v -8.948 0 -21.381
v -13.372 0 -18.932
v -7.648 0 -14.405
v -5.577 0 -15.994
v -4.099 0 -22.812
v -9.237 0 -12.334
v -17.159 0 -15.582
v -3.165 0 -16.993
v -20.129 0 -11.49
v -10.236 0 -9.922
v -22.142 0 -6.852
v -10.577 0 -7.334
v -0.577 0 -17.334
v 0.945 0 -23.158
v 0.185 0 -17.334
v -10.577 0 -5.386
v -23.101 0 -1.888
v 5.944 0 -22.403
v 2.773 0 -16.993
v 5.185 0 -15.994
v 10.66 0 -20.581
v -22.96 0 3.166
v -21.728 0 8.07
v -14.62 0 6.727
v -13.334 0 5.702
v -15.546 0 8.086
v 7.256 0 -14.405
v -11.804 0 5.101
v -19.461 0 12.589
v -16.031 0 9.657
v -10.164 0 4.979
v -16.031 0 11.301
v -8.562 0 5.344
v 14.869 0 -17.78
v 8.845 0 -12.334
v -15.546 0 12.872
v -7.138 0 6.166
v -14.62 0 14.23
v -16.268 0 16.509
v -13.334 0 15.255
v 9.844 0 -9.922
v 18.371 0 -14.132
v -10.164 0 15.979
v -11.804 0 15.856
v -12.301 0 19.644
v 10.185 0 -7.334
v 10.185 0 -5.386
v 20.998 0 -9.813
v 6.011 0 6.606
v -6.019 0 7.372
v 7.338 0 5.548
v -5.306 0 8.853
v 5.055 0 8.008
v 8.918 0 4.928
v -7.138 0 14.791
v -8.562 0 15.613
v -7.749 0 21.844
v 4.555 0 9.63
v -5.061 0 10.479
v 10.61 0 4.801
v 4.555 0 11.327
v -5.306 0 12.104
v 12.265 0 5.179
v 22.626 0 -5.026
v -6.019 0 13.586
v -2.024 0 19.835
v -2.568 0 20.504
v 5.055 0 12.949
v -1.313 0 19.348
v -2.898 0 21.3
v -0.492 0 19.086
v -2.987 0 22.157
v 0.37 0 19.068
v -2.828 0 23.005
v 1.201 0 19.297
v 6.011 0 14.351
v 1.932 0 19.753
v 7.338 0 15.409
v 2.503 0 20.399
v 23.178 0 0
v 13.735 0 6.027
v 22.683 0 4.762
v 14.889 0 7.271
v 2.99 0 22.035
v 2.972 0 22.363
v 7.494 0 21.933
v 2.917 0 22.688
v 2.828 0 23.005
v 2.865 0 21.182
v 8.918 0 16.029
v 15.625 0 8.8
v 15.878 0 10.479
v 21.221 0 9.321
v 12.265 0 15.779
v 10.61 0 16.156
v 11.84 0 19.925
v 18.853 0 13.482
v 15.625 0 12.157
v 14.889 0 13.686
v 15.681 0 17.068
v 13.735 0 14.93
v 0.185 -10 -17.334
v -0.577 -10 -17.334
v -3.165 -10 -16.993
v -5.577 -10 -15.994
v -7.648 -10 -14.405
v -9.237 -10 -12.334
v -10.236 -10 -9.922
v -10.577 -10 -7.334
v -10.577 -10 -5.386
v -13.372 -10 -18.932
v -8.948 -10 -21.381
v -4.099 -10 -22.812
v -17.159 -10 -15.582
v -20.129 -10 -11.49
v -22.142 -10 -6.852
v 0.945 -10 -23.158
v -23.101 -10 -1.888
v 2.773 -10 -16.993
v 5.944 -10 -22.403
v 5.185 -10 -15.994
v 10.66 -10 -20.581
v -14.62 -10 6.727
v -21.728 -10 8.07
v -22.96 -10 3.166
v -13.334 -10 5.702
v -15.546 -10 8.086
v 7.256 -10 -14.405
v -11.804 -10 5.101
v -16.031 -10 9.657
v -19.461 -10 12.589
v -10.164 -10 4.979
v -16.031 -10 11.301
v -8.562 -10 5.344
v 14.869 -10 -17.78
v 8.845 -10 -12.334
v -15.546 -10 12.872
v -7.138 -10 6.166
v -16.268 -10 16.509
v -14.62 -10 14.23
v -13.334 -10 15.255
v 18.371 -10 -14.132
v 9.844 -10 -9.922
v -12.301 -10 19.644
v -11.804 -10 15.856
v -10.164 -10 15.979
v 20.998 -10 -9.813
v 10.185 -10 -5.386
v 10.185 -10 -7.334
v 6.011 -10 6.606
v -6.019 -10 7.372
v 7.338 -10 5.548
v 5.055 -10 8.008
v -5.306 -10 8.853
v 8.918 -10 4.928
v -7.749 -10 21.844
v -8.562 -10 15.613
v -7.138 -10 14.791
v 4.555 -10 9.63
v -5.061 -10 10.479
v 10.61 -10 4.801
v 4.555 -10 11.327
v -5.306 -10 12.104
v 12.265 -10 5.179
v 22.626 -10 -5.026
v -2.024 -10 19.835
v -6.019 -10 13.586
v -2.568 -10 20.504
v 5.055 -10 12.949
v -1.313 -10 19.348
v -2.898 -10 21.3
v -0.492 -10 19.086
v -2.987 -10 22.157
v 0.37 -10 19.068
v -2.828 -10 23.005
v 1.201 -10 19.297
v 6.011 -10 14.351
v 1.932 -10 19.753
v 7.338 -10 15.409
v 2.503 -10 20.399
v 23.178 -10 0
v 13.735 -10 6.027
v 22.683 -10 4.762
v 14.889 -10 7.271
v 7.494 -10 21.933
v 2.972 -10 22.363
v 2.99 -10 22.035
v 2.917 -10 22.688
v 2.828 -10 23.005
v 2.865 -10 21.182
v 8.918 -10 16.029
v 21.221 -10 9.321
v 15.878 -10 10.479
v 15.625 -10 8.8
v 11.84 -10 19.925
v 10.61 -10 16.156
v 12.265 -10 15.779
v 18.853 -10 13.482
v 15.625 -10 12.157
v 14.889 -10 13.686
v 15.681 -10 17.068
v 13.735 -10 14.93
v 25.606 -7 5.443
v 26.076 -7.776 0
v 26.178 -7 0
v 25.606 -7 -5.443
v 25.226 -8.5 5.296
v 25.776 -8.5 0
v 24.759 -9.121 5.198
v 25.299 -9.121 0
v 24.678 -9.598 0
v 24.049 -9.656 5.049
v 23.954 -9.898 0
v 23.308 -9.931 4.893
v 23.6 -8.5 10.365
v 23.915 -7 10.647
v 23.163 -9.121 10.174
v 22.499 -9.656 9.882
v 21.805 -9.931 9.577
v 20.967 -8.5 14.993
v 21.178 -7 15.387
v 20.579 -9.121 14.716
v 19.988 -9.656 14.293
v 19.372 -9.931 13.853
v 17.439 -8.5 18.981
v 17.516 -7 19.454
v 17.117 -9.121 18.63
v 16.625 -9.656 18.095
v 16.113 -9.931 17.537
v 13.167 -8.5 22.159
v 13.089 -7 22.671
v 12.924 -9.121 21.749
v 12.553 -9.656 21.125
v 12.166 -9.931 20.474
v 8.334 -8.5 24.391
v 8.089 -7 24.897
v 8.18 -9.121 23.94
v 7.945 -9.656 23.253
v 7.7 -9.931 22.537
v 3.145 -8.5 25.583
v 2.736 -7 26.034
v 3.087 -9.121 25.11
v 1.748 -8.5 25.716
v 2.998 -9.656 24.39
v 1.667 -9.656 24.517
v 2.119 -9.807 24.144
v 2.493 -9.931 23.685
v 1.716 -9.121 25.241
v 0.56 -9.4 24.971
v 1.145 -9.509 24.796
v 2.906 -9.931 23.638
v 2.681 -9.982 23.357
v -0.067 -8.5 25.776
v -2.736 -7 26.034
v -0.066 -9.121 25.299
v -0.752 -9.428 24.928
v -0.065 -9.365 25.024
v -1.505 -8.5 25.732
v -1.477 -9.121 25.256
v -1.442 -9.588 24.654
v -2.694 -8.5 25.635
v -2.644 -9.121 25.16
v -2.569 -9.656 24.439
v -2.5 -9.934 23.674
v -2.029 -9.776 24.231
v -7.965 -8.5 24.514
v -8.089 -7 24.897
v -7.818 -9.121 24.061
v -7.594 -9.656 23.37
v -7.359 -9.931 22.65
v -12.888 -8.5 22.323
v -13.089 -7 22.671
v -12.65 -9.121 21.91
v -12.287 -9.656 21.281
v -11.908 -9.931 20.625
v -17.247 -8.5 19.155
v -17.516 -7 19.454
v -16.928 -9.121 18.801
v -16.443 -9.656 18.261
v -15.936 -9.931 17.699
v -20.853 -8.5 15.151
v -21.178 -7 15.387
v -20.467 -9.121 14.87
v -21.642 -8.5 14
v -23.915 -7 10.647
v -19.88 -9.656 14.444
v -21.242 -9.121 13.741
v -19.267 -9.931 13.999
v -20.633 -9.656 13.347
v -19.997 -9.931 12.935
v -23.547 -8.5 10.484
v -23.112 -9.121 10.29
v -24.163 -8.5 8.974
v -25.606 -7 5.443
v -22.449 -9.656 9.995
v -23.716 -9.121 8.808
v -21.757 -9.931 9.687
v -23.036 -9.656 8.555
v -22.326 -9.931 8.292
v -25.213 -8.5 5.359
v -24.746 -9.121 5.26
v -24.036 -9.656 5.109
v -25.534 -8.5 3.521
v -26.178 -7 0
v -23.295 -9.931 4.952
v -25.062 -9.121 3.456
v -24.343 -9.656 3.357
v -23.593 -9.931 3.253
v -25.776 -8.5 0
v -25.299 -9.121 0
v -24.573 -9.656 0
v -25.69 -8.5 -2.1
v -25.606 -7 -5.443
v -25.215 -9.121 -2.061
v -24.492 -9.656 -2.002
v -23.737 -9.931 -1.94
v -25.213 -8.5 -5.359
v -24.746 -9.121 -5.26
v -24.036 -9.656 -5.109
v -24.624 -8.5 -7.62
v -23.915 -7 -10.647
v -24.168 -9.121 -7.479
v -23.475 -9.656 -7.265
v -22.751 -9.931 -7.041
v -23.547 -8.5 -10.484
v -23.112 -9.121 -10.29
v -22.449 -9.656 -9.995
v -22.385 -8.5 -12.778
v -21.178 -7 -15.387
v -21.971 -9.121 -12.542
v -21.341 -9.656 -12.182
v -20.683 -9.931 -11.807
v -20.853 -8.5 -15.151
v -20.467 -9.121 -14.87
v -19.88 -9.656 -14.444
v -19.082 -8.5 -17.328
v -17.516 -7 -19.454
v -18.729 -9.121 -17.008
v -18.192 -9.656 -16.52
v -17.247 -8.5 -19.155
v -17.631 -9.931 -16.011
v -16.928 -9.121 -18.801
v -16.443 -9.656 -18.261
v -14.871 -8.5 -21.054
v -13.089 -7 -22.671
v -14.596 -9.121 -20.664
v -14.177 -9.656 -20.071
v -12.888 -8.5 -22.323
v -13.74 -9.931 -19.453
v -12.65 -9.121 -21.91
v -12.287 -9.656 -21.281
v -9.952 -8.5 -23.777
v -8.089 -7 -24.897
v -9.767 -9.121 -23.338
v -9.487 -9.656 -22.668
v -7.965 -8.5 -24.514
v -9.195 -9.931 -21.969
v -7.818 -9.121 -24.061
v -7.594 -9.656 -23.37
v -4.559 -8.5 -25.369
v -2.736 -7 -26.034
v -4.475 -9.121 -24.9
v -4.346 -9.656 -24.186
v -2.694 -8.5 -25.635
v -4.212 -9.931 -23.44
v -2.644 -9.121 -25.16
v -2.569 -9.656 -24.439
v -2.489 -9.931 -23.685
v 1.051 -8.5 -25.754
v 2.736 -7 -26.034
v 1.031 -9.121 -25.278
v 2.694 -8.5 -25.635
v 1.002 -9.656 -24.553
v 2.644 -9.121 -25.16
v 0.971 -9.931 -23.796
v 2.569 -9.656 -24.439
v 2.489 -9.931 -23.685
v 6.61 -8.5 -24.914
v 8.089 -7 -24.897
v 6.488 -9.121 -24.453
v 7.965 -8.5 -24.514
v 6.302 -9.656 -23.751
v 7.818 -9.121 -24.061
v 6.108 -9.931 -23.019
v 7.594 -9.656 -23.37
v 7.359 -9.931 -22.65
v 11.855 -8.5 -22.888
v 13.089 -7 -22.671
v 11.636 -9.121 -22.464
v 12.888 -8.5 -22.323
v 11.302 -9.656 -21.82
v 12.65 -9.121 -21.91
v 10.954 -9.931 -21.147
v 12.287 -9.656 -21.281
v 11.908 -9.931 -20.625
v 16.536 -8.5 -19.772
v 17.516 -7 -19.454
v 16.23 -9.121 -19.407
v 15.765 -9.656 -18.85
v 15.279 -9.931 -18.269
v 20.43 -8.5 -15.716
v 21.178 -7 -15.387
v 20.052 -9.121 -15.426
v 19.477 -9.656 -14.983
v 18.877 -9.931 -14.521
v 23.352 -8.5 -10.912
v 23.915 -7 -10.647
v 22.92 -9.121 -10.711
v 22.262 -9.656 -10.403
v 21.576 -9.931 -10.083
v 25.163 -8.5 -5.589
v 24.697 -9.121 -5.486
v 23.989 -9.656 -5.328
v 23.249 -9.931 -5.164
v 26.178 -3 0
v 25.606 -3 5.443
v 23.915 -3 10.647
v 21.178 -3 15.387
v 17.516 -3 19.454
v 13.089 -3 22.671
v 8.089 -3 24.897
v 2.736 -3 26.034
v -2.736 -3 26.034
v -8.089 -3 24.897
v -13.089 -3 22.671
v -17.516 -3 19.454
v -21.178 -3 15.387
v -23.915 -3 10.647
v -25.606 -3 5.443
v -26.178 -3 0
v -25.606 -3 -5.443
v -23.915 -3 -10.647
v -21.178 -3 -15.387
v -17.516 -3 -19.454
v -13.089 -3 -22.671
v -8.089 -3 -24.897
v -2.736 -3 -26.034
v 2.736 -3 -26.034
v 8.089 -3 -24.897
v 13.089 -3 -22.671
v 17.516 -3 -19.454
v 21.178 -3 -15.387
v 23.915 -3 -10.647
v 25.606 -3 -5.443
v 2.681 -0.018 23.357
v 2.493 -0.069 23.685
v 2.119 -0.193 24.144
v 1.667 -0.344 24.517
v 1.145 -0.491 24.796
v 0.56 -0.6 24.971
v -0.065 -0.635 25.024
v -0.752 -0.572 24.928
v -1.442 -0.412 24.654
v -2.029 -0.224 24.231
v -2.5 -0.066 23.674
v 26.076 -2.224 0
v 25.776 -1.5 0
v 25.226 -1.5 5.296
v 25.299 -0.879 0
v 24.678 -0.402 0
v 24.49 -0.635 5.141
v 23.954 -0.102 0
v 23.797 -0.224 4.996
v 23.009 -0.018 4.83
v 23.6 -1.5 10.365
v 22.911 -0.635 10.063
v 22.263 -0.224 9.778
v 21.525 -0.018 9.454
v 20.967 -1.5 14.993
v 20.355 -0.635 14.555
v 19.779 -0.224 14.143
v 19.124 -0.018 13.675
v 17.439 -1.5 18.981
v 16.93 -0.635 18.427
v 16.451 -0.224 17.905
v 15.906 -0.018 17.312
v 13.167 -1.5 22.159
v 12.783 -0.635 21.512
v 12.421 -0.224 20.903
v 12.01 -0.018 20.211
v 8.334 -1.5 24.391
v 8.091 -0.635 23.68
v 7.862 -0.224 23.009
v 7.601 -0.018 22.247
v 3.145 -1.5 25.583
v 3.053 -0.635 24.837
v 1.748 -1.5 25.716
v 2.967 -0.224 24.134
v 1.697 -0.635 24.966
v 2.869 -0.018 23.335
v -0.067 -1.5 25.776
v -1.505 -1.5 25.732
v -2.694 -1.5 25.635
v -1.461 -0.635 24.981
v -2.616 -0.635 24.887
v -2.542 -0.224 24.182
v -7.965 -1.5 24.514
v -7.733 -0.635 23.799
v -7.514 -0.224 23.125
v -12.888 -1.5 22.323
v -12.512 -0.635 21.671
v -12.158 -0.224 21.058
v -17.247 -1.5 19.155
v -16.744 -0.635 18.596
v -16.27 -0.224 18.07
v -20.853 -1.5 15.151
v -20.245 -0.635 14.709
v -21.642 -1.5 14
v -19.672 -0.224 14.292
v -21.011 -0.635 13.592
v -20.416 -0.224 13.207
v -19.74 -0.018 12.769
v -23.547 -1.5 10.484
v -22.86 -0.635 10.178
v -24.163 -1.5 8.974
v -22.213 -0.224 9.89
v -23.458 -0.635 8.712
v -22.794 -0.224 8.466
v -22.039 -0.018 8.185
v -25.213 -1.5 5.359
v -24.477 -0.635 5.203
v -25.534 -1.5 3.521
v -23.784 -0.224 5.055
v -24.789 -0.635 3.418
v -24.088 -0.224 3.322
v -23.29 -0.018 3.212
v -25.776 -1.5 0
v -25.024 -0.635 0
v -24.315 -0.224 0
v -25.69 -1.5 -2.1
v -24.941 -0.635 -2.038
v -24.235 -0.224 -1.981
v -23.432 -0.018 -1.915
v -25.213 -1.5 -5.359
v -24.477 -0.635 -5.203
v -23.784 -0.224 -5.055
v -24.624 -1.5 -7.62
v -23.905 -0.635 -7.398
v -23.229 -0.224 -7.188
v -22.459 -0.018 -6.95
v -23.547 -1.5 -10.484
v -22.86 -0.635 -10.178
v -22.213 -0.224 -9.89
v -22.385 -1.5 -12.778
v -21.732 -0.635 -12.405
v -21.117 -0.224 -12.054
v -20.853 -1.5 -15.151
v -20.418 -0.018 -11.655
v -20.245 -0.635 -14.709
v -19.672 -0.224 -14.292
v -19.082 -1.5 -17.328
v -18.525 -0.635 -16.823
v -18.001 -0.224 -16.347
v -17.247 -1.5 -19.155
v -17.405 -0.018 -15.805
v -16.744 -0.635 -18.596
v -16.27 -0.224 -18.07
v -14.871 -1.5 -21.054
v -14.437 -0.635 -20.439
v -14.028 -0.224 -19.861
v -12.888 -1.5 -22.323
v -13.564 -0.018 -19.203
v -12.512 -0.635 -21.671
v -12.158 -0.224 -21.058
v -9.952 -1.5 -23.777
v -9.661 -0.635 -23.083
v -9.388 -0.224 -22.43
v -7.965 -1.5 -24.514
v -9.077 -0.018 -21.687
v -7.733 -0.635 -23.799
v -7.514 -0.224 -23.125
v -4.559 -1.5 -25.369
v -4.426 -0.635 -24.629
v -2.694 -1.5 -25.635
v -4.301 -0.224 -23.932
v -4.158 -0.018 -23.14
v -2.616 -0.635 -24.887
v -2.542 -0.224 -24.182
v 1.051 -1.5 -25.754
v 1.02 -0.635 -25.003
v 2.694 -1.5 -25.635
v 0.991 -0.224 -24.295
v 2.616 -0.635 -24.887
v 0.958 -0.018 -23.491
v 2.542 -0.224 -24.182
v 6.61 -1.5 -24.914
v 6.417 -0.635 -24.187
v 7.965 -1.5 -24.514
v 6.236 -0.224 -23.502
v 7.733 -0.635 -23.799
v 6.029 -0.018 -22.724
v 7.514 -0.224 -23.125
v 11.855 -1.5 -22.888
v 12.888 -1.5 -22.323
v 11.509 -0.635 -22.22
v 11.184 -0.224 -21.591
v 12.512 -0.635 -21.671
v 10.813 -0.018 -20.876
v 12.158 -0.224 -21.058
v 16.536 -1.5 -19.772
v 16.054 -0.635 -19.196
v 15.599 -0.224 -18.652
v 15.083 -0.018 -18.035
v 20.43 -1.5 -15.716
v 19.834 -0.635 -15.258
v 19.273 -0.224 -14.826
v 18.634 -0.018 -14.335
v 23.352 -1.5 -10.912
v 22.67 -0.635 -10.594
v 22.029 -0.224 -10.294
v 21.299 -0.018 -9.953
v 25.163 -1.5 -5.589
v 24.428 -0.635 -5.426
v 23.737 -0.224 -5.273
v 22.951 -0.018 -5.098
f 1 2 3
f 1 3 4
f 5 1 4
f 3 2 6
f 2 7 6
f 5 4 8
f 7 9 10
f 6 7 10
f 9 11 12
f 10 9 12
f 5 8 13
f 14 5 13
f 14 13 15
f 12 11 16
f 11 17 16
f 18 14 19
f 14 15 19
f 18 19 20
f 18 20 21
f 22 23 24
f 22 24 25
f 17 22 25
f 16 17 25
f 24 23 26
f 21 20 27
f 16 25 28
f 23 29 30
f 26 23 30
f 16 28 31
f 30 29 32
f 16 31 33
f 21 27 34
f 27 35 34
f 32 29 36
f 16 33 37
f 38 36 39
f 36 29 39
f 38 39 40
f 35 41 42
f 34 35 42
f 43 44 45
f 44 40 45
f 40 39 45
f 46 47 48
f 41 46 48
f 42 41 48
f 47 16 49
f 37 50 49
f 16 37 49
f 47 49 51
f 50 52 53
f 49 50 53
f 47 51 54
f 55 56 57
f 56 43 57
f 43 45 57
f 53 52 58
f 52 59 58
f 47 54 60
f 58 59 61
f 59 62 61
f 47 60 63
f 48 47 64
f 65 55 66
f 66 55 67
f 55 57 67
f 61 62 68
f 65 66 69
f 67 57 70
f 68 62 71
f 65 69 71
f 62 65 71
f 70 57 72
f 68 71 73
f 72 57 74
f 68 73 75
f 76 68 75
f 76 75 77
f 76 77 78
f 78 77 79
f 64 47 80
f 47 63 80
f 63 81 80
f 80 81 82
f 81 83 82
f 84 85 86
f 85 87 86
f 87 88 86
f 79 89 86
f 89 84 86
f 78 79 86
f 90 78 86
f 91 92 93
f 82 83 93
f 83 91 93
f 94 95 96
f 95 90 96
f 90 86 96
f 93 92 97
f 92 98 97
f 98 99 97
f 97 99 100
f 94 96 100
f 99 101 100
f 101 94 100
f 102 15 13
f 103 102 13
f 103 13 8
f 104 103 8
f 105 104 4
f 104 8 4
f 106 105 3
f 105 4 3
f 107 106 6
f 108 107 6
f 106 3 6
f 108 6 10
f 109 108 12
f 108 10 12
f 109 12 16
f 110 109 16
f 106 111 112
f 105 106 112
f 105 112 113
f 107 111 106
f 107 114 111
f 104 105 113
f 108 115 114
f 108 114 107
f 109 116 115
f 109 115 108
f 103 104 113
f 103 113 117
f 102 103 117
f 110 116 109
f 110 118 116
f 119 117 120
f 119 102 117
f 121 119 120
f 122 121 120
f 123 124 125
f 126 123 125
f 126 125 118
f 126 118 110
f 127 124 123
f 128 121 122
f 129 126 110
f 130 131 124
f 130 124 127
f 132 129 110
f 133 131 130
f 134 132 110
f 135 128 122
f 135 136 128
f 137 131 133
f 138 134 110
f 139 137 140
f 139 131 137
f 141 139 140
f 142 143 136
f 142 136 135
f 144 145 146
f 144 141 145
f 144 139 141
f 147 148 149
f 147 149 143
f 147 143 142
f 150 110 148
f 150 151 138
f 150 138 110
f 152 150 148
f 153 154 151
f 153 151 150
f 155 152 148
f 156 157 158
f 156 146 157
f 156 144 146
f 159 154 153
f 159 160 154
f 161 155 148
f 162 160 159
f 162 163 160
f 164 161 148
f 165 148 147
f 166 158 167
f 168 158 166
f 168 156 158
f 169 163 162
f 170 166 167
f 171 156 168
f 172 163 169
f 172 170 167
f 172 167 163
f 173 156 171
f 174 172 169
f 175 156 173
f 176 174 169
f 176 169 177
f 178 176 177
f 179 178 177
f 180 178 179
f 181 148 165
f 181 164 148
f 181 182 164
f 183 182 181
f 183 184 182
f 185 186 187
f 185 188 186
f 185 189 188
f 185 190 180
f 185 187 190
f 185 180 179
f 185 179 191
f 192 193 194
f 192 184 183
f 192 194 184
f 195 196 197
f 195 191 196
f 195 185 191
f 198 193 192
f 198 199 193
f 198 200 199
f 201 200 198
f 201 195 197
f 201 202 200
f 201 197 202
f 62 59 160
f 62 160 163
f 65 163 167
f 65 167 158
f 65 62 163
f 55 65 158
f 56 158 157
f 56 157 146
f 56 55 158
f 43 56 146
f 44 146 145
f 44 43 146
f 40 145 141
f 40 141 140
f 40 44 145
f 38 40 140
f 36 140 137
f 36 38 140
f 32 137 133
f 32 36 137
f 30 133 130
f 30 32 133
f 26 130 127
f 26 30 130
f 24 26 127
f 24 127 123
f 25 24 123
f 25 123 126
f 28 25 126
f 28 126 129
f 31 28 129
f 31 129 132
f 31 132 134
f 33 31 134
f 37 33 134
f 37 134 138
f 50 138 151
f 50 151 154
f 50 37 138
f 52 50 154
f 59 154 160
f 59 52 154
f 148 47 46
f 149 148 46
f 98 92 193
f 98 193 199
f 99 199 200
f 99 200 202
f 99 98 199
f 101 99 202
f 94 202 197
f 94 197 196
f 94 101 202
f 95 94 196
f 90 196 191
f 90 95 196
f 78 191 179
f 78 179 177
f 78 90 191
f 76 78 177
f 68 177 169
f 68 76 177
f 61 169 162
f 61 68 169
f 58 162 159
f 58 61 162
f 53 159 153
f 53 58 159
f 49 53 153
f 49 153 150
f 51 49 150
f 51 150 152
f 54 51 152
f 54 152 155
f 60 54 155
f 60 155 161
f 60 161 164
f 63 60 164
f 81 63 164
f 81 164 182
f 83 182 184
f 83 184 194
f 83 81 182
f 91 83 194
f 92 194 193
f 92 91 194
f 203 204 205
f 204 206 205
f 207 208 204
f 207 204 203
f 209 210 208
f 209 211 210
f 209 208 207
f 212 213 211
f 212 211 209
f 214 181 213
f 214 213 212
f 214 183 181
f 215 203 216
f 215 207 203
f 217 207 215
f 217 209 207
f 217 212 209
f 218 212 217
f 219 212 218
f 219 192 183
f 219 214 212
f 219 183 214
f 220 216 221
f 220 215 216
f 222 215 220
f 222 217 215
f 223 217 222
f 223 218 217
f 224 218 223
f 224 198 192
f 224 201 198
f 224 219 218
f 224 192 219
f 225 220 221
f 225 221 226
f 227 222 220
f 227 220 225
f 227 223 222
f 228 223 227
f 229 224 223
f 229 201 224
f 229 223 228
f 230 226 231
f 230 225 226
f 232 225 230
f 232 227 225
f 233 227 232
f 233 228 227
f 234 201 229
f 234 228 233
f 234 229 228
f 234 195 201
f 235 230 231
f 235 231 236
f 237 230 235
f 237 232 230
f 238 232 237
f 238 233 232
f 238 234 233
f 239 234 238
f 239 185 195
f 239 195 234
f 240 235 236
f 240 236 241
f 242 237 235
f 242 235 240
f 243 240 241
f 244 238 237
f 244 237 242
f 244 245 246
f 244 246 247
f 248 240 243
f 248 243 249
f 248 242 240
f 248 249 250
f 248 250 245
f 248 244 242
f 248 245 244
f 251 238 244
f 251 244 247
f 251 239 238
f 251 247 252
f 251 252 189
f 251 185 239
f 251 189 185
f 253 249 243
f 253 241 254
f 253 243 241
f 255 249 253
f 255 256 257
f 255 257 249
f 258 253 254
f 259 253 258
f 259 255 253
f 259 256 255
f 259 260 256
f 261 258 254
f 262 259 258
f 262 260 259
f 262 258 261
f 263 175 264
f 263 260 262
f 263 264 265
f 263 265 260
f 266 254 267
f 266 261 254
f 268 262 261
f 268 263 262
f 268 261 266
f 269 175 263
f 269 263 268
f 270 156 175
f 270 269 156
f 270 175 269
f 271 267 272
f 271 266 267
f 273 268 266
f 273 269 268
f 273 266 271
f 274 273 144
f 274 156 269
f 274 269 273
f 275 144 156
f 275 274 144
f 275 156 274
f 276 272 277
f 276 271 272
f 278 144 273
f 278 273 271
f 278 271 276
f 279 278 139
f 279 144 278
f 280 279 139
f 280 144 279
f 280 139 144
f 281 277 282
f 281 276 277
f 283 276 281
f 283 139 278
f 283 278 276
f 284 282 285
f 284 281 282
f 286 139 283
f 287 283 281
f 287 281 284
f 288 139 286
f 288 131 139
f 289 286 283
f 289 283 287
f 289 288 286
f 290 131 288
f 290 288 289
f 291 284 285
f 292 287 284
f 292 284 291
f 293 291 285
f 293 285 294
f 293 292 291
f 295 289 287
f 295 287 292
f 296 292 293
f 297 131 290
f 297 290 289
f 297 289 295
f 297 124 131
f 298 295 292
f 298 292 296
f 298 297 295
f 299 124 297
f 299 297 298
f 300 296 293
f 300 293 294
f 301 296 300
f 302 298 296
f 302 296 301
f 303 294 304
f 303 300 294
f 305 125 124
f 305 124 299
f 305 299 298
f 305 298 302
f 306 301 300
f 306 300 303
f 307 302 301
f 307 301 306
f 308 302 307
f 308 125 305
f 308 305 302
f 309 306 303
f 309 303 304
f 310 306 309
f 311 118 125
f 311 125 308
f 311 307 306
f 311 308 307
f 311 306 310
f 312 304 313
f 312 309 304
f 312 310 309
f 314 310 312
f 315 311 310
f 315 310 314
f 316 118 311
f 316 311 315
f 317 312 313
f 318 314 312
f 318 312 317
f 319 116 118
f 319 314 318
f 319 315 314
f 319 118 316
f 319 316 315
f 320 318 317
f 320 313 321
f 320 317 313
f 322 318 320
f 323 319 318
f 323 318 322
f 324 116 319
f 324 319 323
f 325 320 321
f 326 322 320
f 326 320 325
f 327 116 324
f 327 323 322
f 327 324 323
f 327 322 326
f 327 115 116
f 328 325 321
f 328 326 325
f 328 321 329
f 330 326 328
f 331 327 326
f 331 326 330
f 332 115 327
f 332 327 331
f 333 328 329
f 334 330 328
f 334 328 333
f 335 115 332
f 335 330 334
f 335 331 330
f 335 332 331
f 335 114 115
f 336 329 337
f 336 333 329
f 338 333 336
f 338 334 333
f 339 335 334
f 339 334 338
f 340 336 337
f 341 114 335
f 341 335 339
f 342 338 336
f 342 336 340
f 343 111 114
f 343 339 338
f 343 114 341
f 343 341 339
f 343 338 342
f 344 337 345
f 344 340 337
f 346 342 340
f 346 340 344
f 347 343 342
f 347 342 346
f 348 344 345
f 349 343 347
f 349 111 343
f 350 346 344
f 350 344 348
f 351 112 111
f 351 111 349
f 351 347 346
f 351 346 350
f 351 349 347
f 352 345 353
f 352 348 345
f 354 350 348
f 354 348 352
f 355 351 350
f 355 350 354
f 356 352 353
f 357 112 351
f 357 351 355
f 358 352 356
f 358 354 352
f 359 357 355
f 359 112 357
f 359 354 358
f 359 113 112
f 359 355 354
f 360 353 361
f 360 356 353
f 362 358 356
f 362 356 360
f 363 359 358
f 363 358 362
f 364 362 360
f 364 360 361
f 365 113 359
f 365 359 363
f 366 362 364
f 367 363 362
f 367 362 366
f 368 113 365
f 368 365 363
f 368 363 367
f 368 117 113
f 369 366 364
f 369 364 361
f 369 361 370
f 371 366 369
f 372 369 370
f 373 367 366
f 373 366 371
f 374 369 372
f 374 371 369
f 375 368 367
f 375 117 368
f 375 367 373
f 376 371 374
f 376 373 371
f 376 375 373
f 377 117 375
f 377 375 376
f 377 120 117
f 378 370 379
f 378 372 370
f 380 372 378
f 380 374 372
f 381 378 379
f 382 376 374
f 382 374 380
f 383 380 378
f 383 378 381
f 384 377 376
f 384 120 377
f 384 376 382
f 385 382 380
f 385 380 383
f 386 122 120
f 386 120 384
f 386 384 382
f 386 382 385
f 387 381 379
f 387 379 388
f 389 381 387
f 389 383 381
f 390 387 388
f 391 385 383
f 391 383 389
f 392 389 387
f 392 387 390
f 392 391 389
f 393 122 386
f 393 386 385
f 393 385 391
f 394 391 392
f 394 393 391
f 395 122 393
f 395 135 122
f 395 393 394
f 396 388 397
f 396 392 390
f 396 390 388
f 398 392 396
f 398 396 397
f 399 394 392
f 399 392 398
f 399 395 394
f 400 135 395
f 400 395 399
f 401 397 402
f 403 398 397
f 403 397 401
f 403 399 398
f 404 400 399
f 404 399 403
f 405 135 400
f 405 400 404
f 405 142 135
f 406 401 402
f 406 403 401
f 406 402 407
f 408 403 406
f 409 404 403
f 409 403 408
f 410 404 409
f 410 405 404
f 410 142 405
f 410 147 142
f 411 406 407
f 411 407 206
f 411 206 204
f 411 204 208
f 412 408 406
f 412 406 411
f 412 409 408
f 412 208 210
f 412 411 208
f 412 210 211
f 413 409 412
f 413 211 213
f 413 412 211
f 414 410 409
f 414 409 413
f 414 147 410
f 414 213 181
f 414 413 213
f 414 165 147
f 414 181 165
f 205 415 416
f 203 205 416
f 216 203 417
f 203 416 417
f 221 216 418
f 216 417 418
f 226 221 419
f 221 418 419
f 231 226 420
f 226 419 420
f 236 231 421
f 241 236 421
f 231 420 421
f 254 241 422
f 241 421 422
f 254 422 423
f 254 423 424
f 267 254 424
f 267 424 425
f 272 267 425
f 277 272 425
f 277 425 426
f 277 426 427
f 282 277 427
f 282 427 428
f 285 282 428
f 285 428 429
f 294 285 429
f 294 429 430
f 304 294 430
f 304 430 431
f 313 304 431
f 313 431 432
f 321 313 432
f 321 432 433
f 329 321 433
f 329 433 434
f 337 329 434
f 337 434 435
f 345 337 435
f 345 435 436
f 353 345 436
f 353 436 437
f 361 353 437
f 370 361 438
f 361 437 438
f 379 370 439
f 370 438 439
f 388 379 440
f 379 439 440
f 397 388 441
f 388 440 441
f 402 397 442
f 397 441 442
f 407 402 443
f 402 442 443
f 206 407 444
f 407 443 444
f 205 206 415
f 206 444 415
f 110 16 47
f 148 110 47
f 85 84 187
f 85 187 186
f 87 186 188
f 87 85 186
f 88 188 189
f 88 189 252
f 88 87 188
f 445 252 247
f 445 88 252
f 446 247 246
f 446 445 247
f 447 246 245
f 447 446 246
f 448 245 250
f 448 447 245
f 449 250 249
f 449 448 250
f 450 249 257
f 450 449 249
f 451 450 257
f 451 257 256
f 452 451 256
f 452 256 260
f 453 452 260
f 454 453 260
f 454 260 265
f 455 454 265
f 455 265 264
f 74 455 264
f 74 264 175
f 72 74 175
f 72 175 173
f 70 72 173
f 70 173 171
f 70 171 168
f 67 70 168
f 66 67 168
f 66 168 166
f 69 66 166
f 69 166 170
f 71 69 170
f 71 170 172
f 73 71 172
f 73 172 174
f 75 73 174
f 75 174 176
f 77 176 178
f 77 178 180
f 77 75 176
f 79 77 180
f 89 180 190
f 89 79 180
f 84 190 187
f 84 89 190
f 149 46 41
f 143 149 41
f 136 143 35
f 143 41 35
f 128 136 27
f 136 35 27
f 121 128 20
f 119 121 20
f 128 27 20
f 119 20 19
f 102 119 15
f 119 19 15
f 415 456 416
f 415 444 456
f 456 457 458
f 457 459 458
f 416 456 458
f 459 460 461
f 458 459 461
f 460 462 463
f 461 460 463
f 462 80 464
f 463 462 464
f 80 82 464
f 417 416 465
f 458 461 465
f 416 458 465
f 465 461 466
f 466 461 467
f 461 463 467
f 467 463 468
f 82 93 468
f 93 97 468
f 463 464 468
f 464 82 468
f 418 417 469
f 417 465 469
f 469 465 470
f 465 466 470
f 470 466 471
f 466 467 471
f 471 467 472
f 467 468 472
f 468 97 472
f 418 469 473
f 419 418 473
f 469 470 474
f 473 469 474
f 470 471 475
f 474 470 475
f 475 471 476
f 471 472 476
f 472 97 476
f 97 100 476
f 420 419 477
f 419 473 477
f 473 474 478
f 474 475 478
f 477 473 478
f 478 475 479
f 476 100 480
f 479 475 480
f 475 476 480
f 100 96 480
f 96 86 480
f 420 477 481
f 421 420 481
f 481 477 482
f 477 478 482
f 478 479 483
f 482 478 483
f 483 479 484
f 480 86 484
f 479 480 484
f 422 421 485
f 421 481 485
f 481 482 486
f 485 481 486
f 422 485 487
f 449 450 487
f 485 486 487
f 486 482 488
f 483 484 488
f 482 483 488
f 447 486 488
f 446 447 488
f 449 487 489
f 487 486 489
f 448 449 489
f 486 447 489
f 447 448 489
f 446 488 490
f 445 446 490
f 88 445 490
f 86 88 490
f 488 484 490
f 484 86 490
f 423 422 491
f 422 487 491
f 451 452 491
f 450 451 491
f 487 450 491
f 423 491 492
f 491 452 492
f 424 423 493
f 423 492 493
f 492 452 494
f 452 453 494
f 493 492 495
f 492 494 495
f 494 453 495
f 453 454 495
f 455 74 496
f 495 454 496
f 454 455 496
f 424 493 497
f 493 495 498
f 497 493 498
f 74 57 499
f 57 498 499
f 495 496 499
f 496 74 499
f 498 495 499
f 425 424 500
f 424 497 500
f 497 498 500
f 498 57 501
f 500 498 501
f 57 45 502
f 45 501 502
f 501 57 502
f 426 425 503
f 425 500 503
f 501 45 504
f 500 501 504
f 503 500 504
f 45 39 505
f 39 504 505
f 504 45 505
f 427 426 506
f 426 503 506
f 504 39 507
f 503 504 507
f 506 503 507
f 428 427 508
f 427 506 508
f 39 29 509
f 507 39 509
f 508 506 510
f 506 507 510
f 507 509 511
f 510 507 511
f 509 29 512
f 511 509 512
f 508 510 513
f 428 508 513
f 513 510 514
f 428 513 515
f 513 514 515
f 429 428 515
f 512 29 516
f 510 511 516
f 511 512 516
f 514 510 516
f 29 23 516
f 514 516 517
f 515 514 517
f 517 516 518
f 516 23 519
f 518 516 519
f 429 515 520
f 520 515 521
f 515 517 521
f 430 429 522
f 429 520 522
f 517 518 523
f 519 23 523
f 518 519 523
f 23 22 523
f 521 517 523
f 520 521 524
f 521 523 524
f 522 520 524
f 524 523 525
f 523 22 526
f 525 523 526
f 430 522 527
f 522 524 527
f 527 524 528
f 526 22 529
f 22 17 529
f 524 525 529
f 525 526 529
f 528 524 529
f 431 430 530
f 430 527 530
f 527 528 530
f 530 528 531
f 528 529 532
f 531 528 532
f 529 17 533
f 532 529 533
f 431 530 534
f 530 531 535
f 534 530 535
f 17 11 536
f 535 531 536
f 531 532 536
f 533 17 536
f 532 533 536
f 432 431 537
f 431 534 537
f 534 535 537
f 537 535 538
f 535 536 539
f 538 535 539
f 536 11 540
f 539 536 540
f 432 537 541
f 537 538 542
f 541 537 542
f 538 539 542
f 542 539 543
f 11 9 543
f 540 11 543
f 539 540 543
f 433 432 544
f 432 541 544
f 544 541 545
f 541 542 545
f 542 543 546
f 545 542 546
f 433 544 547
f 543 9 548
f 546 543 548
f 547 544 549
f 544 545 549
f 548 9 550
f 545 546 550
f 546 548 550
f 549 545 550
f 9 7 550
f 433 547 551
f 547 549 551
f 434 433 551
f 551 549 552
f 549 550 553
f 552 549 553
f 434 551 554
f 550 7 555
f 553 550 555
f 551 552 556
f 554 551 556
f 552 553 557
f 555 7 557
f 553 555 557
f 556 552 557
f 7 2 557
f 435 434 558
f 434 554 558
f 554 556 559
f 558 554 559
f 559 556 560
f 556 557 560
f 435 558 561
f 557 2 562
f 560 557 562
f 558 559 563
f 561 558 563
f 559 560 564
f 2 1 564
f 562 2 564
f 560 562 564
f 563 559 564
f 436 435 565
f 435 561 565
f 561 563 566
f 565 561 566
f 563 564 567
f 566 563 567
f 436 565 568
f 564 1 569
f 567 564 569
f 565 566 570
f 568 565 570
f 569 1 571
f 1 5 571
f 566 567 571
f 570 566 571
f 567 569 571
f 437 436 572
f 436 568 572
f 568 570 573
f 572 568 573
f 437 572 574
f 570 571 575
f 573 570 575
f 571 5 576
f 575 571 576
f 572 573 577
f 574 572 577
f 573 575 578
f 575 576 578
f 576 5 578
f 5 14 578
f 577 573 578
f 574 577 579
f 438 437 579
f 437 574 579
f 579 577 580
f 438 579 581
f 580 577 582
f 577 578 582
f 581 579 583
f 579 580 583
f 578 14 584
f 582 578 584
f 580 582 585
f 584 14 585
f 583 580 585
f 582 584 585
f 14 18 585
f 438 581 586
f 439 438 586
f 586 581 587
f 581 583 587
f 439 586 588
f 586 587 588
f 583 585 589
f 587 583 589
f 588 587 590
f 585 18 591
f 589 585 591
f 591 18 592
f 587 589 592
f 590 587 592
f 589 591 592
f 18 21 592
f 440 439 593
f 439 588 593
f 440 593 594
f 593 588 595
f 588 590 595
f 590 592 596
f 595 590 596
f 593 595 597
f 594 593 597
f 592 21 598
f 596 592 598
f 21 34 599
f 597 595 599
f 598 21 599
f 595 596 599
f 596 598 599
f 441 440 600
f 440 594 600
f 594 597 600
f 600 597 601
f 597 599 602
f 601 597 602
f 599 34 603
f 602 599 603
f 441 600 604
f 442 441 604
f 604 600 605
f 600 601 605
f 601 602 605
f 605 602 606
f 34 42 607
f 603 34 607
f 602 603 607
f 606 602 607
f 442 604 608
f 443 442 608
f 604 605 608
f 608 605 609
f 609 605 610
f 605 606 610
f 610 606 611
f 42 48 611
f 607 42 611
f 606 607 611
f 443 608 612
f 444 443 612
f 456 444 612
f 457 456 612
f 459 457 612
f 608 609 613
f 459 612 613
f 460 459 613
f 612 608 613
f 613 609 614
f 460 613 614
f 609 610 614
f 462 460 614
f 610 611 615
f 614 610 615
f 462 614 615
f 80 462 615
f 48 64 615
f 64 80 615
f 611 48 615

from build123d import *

# Parameters (mm, degrees)
F0_R     = 26.177757608
F0_R_2   = 5.5155489558
F0_R_3   = 2.9897173108
F0_R_4   = 5.6935154322
F1_DEPTH = 10


# Not quite as in the source:
# - a fillet or chamfer that OpenCascade refuses, or shapes differently, is made with other operations: its cross-section is extruded or revolved along the edge and cut away or added


with BuildPart() as f1:
    # F0 (on Front) → F1 (new body)
    with BuildSketch(Plane.XZ):
        Circle(F0_R)
        with BuildLine():
            Line((-10.5765974149, -7.333868891), (-10.5765974149, -5.3862300701))
            Line((-10.5765974149, -5.3862300701), (10.1848710328, -5.3862300701))
            Line((10.1848710328, -5.3862300701), (10.1848710328, -7.333868891))
            ThreePointArc((10.1848710328, -7.333868891), (7.2559388447, -14.4049367029), (0.1848710328, -17.333868891))
            Line((0.1848710328, -17.333868891), (-0.5765974149, -17.333868891))
            ThreePointArc((-0.5765974149, -17.333868891), (-7.6476652268, -14.4049367029), (-10.5765974149, -7.333868891))
        make_face(mode=Mode.SUBTRACT)
        with Locations((-10.5765974149, 10.4786651209)):
            Circle(F0_R_2, mode=Mode.SUBTRACT)
        with Locations((0, 22.0345780253)):
            Circle(F0_R_3, mode=Mode.SUBTRACT)
        with Locations((10.1848710328, 10.4786651209)):
            Circle(F0_R_4, mode=Mode.SUBTRACT)
    extrude(amount=F1_DEPTH)

    # F2: fillet of radius 3 on 2 edges, made by hand

    # F2_s1 → F2_t2 (revolve, cut)
    with BuildSketch(Plane.XY):
        with BuildLine():
            ThreePointArc((26.177757608, -7), (25.2990779516, -9.1213203436), (23.177757608, -10))
            Line((23.177757608, -10), (26.177757608, -10))
            Line((26.177757608, -10), (26.177757608, -7))
        make_face()
    revolve(axis=Axis((0, -10, 0), (0, -1, 0)), mode=Mode.SUBTRACT)

    # F2_s3 → F2_t4 (revolve, cut)
    with BuildSketch(Plane.XY):
        with BuildLine():
            ThreePointArc((26.177757608, -3), (25.2990779516, -0.8786796564), (23.177757608, 0))
            Line((23.177757608, 0), (26.177757608, 0))
            Line((26.177757608, 0), (26.177757608, -3))
        make_face()
    revolve(axis=Axis((0, 0, 0), (0, -1, 0)), mode=Mode.SUBTRACT)


solid = f1.part
